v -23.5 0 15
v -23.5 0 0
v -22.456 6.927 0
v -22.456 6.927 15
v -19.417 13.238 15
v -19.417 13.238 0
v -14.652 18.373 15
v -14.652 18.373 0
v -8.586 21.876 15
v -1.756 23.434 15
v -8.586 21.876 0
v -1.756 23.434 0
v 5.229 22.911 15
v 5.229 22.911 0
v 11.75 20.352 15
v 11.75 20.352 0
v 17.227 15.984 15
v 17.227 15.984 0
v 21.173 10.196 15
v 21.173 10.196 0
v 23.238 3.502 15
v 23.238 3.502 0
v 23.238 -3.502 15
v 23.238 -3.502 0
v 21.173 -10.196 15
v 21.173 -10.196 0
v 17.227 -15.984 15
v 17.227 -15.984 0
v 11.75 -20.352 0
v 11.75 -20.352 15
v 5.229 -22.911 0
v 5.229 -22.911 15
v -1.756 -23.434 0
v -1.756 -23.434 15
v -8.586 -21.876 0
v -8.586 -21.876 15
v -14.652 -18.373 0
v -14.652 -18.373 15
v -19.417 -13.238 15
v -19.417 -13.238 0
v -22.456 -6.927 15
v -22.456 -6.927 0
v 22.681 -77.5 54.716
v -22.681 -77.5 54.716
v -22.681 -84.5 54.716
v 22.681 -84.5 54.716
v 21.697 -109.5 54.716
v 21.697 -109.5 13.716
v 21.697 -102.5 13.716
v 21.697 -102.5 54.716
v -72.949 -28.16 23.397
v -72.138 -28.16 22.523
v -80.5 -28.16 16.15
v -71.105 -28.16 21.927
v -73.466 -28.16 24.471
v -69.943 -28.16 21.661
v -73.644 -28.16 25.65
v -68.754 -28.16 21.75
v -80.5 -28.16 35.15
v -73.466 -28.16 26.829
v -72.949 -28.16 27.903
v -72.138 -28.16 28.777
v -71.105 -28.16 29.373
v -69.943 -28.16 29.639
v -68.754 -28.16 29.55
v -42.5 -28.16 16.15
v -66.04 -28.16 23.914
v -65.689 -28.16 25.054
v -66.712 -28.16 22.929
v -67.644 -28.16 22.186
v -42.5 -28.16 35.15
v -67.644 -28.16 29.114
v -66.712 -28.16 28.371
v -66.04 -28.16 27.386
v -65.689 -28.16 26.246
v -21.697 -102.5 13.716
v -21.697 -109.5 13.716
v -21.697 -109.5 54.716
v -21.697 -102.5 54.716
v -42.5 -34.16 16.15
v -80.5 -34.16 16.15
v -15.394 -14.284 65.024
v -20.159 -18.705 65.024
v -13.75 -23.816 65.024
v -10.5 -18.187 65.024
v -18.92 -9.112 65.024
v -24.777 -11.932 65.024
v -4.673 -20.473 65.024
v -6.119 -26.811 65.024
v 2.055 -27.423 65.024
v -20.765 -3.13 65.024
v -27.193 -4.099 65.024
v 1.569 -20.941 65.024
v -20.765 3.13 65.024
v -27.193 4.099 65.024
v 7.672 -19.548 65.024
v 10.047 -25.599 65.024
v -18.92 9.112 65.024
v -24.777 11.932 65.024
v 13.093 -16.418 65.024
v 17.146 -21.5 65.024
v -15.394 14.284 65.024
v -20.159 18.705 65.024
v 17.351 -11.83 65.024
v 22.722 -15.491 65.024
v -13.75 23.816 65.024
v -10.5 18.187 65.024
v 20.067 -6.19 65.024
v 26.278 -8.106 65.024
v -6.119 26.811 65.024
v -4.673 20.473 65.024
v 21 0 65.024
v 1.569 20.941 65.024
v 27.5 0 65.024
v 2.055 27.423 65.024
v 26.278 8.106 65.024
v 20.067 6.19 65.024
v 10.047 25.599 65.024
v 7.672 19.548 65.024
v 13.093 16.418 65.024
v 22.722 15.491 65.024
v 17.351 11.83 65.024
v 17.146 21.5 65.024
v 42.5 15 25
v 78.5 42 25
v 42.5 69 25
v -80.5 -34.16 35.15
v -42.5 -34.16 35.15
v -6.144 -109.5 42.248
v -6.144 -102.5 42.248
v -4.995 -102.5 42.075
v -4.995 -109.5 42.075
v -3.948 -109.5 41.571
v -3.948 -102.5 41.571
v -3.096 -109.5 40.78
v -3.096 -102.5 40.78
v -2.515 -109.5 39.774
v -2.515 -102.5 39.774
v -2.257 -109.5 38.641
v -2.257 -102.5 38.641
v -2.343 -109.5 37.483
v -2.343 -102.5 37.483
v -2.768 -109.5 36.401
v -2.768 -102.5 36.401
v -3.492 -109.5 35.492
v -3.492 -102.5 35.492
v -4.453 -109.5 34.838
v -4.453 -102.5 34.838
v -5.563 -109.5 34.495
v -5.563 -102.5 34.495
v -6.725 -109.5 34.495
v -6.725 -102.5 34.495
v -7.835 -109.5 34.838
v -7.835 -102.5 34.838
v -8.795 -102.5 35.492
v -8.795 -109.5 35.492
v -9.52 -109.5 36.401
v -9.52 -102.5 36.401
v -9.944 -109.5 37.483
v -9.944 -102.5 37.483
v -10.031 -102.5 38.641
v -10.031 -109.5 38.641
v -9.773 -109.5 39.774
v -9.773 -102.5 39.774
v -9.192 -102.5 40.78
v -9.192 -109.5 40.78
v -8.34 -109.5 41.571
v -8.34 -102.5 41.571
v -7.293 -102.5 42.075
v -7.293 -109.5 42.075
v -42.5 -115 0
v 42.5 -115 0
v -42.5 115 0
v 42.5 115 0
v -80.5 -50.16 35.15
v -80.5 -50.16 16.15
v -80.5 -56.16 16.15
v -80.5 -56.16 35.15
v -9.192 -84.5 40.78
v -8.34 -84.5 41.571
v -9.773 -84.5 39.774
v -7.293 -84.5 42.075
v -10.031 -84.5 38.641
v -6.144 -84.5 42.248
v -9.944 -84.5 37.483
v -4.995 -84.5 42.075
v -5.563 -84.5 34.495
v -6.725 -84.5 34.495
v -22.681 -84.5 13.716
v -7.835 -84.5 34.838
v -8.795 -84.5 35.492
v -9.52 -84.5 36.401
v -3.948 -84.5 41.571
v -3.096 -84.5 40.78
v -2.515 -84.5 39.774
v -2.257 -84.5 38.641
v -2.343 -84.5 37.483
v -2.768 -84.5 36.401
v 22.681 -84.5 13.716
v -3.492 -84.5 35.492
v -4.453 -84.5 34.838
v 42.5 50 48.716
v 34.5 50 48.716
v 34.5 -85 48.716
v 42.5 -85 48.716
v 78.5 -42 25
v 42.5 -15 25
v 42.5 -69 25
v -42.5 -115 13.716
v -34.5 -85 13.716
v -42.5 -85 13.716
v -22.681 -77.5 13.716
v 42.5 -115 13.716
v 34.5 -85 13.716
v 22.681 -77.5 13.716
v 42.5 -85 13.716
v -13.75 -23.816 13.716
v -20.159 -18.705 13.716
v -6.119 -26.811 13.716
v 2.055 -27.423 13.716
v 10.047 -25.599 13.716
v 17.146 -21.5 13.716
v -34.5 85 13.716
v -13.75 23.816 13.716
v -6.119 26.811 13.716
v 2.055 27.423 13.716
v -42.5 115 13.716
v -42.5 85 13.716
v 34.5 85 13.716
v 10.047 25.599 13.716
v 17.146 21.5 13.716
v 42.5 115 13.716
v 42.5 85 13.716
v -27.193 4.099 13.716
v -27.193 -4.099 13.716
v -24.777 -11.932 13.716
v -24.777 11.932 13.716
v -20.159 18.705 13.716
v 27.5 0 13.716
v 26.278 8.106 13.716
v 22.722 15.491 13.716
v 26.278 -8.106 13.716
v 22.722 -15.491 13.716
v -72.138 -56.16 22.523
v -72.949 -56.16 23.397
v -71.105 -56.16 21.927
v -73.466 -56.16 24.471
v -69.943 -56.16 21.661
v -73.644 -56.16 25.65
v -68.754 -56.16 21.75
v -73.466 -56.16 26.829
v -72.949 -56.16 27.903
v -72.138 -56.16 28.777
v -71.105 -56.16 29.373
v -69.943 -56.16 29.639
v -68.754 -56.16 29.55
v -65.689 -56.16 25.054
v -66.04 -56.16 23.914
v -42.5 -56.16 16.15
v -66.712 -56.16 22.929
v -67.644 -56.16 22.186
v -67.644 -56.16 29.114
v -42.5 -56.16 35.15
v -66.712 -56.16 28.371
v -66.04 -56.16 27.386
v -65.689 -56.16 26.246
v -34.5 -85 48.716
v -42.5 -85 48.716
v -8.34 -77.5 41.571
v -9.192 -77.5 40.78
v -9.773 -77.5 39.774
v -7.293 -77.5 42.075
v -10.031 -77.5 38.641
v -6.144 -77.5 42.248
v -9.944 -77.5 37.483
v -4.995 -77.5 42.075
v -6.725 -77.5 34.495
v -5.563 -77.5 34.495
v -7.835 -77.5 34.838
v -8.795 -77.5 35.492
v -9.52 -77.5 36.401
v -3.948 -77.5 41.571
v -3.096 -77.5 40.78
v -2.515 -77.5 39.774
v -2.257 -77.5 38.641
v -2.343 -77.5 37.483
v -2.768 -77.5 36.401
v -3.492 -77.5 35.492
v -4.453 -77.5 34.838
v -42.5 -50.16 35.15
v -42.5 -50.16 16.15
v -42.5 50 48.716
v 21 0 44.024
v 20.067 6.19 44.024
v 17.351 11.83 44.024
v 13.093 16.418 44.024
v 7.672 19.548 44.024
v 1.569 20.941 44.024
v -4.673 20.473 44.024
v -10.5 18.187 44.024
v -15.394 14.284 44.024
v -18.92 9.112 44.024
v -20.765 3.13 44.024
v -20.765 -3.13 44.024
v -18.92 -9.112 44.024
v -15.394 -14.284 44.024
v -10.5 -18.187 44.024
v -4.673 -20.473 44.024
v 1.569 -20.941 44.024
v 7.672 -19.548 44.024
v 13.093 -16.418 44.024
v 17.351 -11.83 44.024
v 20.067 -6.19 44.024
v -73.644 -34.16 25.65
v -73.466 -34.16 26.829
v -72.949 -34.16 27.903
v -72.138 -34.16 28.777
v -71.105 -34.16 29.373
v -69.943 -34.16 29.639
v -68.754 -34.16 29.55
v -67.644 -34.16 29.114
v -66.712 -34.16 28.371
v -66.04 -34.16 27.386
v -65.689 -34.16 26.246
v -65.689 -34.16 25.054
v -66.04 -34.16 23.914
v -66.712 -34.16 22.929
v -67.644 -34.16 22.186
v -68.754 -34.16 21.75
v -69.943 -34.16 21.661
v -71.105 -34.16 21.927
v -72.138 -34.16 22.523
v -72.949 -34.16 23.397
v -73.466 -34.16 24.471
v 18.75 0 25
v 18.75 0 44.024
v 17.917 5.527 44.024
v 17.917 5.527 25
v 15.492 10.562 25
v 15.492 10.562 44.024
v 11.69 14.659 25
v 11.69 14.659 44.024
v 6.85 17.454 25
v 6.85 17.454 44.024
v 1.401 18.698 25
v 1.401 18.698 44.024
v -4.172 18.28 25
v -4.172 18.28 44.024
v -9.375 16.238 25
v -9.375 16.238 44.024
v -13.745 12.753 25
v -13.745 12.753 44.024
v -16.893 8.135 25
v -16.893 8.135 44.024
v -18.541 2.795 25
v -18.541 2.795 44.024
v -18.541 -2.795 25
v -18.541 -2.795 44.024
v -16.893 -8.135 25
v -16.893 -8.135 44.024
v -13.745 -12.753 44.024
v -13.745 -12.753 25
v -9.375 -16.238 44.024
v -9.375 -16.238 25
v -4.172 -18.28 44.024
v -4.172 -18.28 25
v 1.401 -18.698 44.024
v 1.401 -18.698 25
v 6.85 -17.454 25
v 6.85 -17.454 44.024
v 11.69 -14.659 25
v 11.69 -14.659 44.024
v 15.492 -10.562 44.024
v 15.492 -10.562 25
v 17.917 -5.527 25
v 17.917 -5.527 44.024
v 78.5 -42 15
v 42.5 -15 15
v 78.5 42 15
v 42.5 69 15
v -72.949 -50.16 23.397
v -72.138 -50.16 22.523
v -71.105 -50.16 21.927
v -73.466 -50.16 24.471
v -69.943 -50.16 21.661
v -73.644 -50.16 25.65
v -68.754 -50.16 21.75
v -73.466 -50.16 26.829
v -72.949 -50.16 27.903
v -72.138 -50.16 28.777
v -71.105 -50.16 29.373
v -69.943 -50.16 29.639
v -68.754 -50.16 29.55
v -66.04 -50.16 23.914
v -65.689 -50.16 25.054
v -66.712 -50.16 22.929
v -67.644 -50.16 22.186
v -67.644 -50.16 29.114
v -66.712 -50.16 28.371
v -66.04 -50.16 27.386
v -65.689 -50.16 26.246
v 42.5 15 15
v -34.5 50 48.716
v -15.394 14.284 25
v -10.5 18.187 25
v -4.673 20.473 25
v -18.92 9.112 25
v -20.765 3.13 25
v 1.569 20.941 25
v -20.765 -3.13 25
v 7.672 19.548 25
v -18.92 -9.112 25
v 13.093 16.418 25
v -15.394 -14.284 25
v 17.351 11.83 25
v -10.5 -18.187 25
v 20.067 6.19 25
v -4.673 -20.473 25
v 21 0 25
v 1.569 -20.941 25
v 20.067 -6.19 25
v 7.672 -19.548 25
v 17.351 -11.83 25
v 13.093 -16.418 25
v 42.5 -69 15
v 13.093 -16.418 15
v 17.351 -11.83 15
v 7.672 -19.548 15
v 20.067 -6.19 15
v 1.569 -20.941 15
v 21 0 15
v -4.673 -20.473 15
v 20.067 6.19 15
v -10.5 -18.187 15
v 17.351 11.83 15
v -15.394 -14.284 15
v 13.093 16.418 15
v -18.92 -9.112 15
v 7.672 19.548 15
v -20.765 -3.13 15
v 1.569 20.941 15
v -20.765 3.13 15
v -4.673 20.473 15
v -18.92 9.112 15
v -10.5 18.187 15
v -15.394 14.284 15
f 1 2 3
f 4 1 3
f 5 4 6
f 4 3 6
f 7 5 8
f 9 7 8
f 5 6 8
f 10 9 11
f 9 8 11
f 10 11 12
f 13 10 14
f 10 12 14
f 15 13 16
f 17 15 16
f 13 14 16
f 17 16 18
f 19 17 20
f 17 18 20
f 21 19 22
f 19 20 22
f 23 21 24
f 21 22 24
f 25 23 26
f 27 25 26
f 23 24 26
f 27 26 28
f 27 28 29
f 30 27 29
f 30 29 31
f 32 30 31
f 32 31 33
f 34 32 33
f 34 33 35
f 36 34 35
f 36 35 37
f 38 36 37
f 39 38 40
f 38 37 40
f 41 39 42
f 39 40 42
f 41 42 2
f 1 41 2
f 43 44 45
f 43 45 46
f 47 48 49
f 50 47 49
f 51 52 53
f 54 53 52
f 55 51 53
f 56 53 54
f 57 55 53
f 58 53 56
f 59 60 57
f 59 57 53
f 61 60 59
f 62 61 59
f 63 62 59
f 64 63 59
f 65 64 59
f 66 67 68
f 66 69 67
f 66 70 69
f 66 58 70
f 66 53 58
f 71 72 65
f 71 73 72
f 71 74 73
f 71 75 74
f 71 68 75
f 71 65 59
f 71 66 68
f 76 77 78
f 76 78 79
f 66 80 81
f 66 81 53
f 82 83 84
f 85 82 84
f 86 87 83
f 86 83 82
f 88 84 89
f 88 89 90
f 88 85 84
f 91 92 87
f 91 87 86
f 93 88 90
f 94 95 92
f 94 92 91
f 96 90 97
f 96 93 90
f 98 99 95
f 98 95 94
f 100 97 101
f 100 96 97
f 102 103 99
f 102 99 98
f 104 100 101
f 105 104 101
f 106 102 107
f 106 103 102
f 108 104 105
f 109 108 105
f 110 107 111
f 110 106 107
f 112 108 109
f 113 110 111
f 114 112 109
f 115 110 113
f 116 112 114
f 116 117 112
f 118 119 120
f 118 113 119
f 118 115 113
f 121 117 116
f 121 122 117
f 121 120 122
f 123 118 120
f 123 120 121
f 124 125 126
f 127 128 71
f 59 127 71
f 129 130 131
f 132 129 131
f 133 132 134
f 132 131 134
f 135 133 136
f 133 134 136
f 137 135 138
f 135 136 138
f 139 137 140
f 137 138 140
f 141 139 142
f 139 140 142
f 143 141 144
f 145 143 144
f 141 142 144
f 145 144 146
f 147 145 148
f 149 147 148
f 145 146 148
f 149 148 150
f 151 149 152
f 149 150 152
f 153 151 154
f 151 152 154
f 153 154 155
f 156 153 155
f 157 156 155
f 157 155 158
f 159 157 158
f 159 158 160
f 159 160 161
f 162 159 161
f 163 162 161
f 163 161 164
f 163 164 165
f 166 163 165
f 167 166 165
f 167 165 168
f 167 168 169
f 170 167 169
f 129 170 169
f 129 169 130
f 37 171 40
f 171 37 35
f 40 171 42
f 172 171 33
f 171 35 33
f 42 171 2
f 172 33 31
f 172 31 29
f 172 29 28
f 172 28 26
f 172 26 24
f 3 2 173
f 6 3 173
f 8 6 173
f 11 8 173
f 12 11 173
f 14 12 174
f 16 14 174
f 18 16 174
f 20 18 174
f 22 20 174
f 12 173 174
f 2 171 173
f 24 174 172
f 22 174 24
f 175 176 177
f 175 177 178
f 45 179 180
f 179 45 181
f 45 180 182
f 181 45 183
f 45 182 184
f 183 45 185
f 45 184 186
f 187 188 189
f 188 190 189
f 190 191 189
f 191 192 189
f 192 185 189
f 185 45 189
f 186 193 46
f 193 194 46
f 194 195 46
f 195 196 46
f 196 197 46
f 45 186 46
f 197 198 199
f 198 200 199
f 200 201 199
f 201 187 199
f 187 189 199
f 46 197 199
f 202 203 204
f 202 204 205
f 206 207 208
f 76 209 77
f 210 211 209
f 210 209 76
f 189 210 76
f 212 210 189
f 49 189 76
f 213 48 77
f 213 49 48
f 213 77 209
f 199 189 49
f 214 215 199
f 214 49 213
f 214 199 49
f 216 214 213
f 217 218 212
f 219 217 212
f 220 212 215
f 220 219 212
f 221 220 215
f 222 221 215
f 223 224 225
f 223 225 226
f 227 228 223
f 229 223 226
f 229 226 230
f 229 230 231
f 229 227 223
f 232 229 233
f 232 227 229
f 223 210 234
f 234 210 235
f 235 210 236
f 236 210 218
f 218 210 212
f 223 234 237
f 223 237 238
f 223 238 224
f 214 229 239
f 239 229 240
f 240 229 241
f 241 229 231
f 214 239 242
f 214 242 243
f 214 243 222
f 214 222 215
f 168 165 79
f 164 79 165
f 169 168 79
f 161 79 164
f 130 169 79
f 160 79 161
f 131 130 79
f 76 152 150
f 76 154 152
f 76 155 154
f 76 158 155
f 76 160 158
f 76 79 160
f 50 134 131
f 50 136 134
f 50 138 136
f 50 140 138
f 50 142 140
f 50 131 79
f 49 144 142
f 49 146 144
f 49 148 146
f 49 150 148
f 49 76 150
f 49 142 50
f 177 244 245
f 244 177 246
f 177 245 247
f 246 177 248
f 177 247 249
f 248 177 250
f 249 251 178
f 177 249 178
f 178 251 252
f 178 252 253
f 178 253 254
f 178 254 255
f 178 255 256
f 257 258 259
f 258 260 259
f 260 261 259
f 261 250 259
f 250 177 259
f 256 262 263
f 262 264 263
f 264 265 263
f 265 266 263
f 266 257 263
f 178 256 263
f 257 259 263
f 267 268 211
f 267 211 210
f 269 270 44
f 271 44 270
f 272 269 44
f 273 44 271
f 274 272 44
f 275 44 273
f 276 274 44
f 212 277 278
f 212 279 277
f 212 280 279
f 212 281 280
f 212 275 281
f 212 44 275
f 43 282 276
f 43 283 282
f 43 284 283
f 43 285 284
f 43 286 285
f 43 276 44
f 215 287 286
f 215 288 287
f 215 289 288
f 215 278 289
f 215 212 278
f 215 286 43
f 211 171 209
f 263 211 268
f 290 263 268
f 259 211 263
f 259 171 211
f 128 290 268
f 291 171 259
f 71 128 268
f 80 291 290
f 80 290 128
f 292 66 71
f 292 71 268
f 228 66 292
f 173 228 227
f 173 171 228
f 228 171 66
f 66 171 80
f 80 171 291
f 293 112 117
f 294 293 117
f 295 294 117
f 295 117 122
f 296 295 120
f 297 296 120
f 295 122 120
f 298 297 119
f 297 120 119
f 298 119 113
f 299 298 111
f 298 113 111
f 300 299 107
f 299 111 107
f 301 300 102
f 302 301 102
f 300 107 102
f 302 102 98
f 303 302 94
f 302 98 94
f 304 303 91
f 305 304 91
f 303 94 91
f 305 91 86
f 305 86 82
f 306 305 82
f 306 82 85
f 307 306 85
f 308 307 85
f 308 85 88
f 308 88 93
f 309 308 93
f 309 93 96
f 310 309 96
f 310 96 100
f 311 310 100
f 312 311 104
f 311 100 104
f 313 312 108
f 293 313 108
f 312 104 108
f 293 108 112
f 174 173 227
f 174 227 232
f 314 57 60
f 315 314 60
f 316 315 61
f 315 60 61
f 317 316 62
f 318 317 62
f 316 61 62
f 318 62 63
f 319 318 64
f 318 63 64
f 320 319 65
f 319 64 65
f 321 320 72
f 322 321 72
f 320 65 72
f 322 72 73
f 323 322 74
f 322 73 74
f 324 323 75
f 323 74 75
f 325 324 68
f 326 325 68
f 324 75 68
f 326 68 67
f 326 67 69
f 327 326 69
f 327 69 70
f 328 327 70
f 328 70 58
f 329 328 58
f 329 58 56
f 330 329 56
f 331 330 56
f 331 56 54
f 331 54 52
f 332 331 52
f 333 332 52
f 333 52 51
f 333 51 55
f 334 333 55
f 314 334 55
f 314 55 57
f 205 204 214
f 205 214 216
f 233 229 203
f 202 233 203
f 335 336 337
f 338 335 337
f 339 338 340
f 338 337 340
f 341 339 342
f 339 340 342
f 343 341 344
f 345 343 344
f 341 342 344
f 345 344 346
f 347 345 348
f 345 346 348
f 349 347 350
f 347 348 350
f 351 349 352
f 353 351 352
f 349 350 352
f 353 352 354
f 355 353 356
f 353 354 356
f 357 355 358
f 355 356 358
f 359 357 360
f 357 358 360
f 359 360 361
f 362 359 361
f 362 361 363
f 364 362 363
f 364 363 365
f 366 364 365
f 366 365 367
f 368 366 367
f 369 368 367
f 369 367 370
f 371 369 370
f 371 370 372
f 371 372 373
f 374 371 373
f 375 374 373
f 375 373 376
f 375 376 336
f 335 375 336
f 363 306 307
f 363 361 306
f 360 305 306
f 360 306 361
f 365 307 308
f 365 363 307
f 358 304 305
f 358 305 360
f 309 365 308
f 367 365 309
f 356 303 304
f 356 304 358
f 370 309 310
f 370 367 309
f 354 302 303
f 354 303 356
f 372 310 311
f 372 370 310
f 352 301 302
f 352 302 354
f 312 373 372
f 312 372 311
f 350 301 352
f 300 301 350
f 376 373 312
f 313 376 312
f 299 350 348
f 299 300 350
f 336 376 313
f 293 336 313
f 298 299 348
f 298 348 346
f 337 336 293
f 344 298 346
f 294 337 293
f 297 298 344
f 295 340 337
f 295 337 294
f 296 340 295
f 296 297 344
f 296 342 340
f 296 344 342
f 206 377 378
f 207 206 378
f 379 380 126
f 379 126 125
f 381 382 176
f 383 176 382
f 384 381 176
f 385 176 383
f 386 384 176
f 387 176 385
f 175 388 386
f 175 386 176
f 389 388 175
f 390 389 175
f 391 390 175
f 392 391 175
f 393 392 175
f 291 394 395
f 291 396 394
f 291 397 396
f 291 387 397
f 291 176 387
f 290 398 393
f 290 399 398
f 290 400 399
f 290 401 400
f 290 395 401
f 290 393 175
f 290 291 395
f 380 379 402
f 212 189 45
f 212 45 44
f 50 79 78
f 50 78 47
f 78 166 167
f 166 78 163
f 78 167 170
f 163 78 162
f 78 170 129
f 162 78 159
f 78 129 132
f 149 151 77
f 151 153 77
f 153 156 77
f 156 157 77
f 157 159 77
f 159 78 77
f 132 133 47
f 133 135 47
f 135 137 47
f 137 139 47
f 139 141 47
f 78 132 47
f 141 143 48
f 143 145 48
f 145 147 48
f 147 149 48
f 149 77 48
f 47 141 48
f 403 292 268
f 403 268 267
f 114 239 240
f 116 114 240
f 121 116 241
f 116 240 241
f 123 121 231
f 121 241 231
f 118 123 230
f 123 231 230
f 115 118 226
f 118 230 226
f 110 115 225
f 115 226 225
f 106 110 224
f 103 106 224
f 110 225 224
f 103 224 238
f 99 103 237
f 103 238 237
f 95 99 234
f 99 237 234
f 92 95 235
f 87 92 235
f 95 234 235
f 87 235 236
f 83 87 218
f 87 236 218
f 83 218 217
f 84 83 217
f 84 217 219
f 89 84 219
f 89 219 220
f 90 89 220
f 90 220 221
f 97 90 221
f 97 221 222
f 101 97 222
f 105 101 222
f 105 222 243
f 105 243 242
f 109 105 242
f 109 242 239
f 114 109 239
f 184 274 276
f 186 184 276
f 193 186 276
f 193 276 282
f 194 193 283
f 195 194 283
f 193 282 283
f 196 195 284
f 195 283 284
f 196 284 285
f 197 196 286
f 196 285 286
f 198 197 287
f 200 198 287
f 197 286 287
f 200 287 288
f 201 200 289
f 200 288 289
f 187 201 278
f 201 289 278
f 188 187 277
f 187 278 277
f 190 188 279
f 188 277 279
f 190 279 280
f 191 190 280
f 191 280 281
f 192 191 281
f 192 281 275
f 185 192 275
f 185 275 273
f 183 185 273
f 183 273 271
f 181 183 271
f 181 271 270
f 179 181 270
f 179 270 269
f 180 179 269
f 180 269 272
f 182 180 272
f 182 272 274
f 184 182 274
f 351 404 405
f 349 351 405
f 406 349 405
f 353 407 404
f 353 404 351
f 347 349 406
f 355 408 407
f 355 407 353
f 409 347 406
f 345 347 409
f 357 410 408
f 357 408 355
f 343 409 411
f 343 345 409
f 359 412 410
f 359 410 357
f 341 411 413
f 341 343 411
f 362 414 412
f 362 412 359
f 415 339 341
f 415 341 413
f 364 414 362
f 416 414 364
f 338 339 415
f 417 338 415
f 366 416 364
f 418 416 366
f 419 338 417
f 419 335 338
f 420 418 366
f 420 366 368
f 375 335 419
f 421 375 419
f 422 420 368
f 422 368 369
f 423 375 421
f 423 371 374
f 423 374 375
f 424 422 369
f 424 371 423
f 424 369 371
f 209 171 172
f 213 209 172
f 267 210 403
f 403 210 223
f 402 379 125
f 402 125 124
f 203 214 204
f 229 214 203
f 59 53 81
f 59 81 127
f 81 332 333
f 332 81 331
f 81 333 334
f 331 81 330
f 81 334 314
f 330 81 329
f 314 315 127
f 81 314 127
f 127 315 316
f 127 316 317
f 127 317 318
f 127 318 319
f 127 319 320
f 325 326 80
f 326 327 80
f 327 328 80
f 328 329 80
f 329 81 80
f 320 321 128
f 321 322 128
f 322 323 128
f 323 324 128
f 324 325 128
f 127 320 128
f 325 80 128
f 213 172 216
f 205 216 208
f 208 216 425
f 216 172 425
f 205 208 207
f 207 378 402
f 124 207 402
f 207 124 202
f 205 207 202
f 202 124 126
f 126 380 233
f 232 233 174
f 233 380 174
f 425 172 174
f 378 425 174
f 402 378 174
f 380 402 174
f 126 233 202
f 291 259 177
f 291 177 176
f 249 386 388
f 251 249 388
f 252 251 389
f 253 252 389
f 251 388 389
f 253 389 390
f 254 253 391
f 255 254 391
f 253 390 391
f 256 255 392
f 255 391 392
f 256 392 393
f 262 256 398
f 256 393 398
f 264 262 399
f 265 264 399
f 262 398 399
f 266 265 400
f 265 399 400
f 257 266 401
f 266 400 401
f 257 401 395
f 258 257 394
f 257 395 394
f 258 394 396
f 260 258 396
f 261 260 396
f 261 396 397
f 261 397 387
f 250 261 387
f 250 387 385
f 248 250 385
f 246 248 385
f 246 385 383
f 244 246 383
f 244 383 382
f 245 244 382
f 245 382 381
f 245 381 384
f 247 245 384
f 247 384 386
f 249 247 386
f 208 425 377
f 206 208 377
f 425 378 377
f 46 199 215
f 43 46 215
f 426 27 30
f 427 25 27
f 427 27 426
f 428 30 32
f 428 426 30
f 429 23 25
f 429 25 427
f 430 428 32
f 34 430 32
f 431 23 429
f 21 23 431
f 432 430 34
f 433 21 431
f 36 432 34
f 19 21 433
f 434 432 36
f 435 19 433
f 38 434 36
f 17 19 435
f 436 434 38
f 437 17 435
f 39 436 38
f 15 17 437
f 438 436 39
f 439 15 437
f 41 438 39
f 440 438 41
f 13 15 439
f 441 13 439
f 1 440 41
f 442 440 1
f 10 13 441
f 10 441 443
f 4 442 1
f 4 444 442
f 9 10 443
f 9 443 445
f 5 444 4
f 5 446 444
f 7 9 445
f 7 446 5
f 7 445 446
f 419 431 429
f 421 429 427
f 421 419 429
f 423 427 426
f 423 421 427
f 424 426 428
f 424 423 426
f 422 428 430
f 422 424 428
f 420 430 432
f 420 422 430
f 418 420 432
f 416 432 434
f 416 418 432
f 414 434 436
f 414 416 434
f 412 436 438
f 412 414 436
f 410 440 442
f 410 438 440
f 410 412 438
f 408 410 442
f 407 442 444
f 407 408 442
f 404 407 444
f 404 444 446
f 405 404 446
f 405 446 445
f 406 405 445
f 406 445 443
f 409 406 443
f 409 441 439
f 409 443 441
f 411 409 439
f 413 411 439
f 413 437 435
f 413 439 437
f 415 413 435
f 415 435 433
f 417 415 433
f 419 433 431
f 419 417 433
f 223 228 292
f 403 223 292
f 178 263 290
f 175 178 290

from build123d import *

# Parameters (mm, degrees)
SKETCH2_R           = 27.5
BOSS_EXTRUDE1_DEPTH = 65.024
SKETCH3_W           = 85
SKETCH3_H           = 230
BOSS_EXTRUDE2_DEPTH = 13.716
SKETCH4_W           = 43.394113748
SKETCH4_H           = 7
SKETCH4_W_2         = 45.361068276
BOSS_EXTRUDE3_DEPTH = 41
SKETCH7_R           = 18.75
CUT_EXTRUDE3_DEPTH  = 65.024
SKETCH5_R           = 21
CUT_EXTRUDE1_DEPTH  = 21
SKETCH6_R           = 23.5
CUT_EXTRUDE2_DEPTH  = 15
CUT_EXTRUDE4_START  = -25
SKETCH8_R           = 21
CUT_EXTRUDE4_DEPTH  = 25
SKETCH10_W          = 8
SKETCH10_H          = 170
BOSS_EXTRUDE4_DEPTH = 35
CUT_EXTRUDE5_REACH  = 159.093
CUT_EXTRUDE6_REACH  = 209.583
SKETCH14_R          = 3.898215838
BOSS_EXTRUDE5_START = 15
BOSS_EXTRUDE5_DEPTH = 10
SKETCH21_W          = 19
SKETCH21_H          = 6
BOSS_EXTRUDE6_DEPTH = 38
CUT_EXTRUDE7_REACH  = 178.644
SKETCH22_R          = 4


with BuildPart() as part:
    # Sketch2 → Boss-Extrude1 (new body)
    with BuildSketch(Plane.XY):
        Circle(SKETCH2_R)
    extrude(amount=BOSS_EXTRUDE1_DEPTH)

    # Sketch3 → Boss-Extrude2 (add)
    with BuildSketch(Plane.XY):
        Rectangle(SKETCH3_W, SKETCH3_H)
    extrude(amount=BOSS_EXTRUDE2_DEPTH)

    # Sketch4 → Boss-Extrude3 (add)
    with BuildSketch(Plane.XY.offset(13.716)):
        with Locations((0, -106)):
            Rectangle(SKETCH4_W, SKETCH4_H)
        with Locations((0, -81)):
            Rectangle(SKETCH4_W_2, SKETCH4_H)
    extrude(amount=BOSS_EXTRUDE3_DEPTH)

    # Sketch7 → Cut-Extrude3 (cut)
    with BuildSketch(Plane.XY.offset(65.024)):
        Circle(SKETCH7_R)
    extrude(amount=-CUT_EXTRUDE3_DEPTH, mode=Mode.SUBTRACT)

    # Sketch5 → Cut-Extrude1 (cut)
    with BuildSketch(Plane.XY.offset(65.024)):
        Circle(SKETCH5_R)
    extrude(amount=-CUT_EXTRUDE1_DEPTH, mode=Mode.SUBTRACT)

    # Sketch6 → Cut-Extrude2 (cut)
    with BuildSketch(Plane(origin=(0, 0, 0), x_dir=(-1, 0, 0), z_dir=(0, 0, -1))):
        Circle(SKETCH6_R)
    extrude(amount=-CUT_EXTRUDE2_DEPTH, mode=Mode.SUBTRACT)

    # Sketch8 → Cut-Extrude4 (cut)
    with BuildSketch(Plane(origin=(0, 0, 0), x_dir=(-1, 0, 0), z_dir=(0, 0, -1)).offset(CUT_EXTRUDE4_START)):
        with Locations(Location((0, 0, 0), (0, 0, 180))):
            Circle(SKETCH8_R)
    extrude(amount=CUT_EXTRUDE4_DEPTH, mode=Mode.SUBTRACT)

    # Sketch10 → Boss-Extrude4 (add)
    with BuildSketch(Plane.XY.offset(13.716)):
        with Locations((-38.5, 0)):
            Rectangle(SKETCH10_W, SKETCH10_H)
        with Locations((38.5, 0)):
            Rectangle(SKETCH10_W, SKETCH10_H)
    extrude(amount=BOSS_EXTRUDE4_DEPTH)

    # Cut-Extrude5: up to this face of the body (flat: up to its plane)
    cut_extrude5_end = Plane(part.part.faces().sort_by_distance((42.5, 0, 22.776198113))[0])
    # Sketch11 → Cut-Extrude5 (cut, up to the picked face)
    with BuildSketch(Plane.ZY.offset(42.5), mode=Mode.PRIVATE) as cut_extrude5_sk1:
        Polygon((13.716, 85), (48.716, 50), (48.716, 85), align=None)
    cut_extrude5_tool1 = split(extrude(cut_extrude5_sk1.sketch, amount=-CUT_EXTRUDE5_REACH, mode=Mode.PRIVATE), bisect_by=cut_extrude5_end, keep=Keep.BOTH, mode=Mode.PRIVATE)
    add(cut_extrude5_tool1.solids().sort_by(Axis((-42.5, 73.333333, 37.049333), (1, 0, 0)))[0], mode=Mode.SUBTRACT)

    # Cut-Extrude6: up to this face of the body (flat: up to its plane)
    cut_extrude6_end = Plane(part.part.faces().sort_by_distance((0, -109.5, 34.216))[0])
    # Sketch14 → Cut-Extrude6 (cut, up to the picked face)
    with BuildSketch(Plane(origin=(0, -77.5, 0), x_dir=(1, 0, 0), z_dir=(0, 1, 0)), mode=Mode.PRIVATE) as cut_extrude6_sk1:
        with Locations(Location((-6.143911141, -38.35, 0), (0, 0, 270))):
            Circle(SKETCH14_R)
    cut_extrude6_tool1 = split(extrude(cut_extrude6_sk1.sketch, amount=-CUT_EXTRUDE6_REACH, mode=Mode.PRIVATE), bisect_by=cut_extrude6_end, keep=Keep.BOTH, mode=Mode.PRIVATE)
    add(cut_extrude6_tool1.solids().sort_by(Axis((-6.143911, -77.5, 38.35), (0, -1, 0)))[0], mode=Mode.SUBTRACT)

    # Sketch16 → Boss-Extrude5 (add)
    with BuildSketch(Plane.XY.offset(BOSS_EXTRUDE5_START)):
        Polygon((78.5, -42), (42.5, -15), (42.5, -69), align=None)
        Polygon((42.5, 69), (78.5, 42), (42.5, 15), align=None)
    extrude(amount=BOSS_EXTRUDE5_DEPTH)

    # Sketch21 → Boss-Extrude6 (add)
    with BuildSketch(Plane.ZY.offset(42.5)):
        with Locations((25.65, -53.16)):
            Rectangle(SKETCH21_W, SKETCH21_H)
        with Locations((25.65, -31.16)):
            Rectangle(SKETCH21_W, SKETCH21_H)
    extrude(amount=BOSS_EXTRUDE6_DEPTH)

    # Cut-Extrude7: up to this face of the body (flat: up to its plane)
    cut_extrude7_end = Plane(part.part.faces().sort_by_distance((-61.5, -56.16, 25.65))[0])
    # Sketch22 → Cut-Extrude7 (cut, up to the picked face)
    with BuildSketch(Plane(origin=(0, -28.16, 0), x_dir=(1, 0, 0), z_dir=(0, 1, 0)), mode=Mode.PRIVATE) as cut_extrude7_sk1:
        with Locations(Location((-69.643911141, -25.65, 0), (0, 0, 180))):
            Circle(SKETCH22_R)
    cut_extrude7_tool1 = split(extrude(cut_extrude7_sk1.sketch, amount=-CUT_EXTRUDE7_REACH, mode=Mode.PRIVATE), bisect_by=cut_extrude7_end, keep=Keep.BOTH, mode=Mode.PRIVATE)
    add(cut_extrude7_tool1.solids().sort_by(Axis((-69.643911, -28.16, 25.65), (0, -1, 0)))[0], mode=Mode.SUBTRACT)


solid = part.part
